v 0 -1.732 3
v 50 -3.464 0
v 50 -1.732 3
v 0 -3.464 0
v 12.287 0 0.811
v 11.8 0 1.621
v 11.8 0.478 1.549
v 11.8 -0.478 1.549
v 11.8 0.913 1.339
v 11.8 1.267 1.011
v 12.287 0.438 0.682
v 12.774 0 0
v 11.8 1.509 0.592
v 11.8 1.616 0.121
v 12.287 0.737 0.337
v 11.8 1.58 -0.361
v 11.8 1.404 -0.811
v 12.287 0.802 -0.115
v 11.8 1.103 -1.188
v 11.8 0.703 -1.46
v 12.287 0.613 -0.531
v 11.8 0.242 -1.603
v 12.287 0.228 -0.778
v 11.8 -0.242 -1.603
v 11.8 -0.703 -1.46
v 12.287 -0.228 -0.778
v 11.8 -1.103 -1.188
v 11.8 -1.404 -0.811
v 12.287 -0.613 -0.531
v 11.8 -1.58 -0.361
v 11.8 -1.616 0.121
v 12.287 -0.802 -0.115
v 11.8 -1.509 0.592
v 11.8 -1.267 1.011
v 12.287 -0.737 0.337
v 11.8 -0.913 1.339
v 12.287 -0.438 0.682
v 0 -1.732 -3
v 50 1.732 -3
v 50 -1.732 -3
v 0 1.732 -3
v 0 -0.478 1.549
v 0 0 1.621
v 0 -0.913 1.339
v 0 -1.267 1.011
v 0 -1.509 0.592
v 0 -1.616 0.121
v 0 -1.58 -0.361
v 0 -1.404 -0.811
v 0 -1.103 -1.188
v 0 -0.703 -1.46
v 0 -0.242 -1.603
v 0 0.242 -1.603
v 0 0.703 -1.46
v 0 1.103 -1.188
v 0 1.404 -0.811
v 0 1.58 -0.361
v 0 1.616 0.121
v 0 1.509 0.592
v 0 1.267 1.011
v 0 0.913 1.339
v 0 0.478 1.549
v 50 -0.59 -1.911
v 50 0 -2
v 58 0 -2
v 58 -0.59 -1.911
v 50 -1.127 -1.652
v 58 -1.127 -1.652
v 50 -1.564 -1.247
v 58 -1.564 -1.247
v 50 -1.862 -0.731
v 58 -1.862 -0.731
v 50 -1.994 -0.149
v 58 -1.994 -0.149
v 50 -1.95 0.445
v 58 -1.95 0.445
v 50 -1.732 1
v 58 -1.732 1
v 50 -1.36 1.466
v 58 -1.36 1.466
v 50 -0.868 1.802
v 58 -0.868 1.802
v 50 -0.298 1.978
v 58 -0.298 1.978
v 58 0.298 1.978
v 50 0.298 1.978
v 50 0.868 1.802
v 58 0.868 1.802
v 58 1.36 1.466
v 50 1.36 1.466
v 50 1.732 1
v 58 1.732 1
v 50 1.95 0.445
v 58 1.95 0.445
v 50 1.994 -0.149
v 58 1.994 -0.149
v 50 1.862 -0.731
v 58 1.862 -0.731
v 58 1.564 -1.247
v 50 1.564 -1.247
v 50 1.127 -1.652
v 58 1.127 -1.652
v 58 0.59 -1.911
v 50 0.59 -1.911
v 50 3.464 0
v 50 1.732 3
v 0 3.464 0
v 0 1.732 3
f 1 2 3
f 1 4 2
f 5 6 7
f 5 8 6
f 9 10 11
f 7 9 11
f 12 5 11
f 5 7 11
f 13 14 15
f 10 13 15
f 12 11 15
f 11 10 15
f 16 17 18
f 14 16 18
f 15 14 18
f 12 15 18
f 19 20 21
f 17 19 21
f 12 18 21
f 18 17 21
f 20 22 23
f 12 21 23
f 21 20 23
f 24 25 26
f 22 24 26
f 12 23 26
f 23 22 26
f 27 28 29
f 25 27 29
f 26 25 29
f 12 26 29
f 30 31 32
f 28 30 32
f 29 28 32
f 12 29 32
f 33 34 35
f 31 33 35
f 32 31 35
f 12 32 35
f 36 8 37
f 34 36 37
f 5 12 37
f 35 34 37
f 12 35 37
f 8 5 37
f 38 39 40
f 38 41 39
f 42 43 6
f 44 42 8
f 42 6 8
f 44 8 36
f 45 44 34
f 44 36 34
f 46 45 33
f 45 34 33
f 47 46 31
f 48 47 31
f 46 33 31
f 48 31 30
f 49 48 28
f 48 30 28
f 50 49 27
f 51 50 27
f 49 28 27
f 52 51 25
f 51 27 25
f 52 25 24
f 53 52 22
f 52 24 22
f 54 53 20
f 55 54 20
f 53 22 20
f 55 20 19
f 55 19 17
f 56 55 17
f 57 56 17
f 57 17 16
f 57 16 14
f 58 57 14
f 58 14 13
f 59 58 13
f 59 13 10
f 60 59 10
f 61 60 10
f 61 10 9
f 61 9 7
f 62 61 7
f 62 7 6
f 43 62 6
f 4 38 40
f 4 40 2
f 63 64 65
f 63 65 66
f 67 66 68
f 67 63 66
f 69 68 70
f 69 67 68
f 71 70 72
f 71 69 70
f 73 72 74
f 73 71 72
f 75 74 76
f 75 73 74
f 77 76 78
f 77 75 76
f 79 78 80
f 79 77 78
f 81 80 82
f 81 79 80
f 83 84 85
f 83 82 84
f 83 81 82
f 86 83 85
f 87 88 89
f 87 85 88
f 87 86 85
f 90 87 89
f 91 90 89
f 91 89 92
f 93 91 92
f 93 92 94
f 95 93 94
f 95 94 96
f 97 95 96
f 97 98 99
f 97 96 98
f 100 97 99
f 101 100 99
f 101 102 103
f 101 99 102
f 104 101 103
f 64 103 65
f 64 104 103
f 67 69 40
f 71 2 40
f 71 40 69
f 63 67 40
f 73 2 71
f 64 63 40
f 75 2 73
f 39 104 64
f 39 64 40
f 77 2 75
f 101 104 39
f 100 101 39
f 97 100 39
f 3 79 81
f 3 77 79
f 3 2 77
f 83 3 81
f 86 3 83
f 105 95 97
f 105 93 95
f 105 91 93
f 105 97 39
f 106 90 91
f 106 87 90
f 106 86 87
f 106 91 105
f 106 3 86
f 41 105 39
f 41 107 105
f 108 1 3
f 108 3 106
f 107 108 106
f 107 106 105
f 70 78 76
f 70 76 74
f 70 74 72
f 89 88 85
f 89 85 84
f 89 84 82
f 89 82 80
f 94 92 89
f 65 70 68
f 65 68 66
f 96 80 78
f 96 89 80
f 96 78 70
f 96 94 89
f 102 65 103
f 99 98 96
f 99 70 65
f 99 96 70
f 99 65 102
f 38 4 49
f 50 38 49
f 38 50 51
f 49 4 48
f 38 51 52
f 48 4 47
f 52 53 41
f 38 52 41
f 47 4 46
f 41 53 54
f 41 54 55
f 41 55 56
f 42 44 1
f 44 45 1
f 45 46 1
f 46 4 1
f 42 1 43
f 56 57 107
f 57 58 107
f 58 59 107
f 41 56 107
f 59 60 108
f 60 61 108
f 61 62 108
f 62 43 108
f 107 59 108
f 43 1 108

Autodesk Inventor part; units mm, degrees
ref_plane "YZ Plane" through (0, 0, 0) normal (1, 0, 0) x (0, 1, 0)
ref_plane "XZ Plane" through (0, 0, 0) normal (0, 1, 0) x (-1, 0, 0)
ref_plane "XY Plane" through (0, 0, 0) normal (0, 0, 1) x (1, 0, 0)
sketch "スケッチ1" plane through (0, 0, 0) normal (1, 0, 0) x (0, 1, 0)
  line L0 (1.7321, -3) -> (-1.7321, -3)
  line L1 (-1.7321, -3) -> (-3.4641, 0)
  line L2 (-3.4641, 0) -> (-1.7321, 3)
  line L3 (-1.7321, 3) -> (1.7321, 3)
  line L4 (1.7321, 3) -> (3.4641, 0)
  line L5 (3.4641, 0) -> (1.7321, -3)
  point P0 (0, 0)
  point P1 (0, 0)
  dimension "d0" = 6
extrude "押し出し1" add sketch "スケッチ1" along normal blind 50
sketch "スケッチ2" plane through (50, 0, 0) normal (1, 0, 0) x (0, 0, -1)
  circle A0 centre (0, 0) radius 2
  dimension "d3" = 4
extrude "押し出し2" add sketch "スケッチ2" along normal blind 8
thread "ねじ1" size "M4x0.7" class "6g" standard "ANSI Metric M Profile" full length
sketch "スケッチ3" plane through (0, 0, 0) normal (-1, 0, 0) x (0, 0, 1)
  point P0 (0, 0)
  point P1 (0, 0)
hole "穴1" at (0, 0, 0) direction (1, 0, 0) diameter 3.242 depth 11.8 tip angle 118 thread size "M4x0.7" class "6H" standard "ISO Metric profile"
properties part number "Spacer_M4_L45" material "鋼、合金"
